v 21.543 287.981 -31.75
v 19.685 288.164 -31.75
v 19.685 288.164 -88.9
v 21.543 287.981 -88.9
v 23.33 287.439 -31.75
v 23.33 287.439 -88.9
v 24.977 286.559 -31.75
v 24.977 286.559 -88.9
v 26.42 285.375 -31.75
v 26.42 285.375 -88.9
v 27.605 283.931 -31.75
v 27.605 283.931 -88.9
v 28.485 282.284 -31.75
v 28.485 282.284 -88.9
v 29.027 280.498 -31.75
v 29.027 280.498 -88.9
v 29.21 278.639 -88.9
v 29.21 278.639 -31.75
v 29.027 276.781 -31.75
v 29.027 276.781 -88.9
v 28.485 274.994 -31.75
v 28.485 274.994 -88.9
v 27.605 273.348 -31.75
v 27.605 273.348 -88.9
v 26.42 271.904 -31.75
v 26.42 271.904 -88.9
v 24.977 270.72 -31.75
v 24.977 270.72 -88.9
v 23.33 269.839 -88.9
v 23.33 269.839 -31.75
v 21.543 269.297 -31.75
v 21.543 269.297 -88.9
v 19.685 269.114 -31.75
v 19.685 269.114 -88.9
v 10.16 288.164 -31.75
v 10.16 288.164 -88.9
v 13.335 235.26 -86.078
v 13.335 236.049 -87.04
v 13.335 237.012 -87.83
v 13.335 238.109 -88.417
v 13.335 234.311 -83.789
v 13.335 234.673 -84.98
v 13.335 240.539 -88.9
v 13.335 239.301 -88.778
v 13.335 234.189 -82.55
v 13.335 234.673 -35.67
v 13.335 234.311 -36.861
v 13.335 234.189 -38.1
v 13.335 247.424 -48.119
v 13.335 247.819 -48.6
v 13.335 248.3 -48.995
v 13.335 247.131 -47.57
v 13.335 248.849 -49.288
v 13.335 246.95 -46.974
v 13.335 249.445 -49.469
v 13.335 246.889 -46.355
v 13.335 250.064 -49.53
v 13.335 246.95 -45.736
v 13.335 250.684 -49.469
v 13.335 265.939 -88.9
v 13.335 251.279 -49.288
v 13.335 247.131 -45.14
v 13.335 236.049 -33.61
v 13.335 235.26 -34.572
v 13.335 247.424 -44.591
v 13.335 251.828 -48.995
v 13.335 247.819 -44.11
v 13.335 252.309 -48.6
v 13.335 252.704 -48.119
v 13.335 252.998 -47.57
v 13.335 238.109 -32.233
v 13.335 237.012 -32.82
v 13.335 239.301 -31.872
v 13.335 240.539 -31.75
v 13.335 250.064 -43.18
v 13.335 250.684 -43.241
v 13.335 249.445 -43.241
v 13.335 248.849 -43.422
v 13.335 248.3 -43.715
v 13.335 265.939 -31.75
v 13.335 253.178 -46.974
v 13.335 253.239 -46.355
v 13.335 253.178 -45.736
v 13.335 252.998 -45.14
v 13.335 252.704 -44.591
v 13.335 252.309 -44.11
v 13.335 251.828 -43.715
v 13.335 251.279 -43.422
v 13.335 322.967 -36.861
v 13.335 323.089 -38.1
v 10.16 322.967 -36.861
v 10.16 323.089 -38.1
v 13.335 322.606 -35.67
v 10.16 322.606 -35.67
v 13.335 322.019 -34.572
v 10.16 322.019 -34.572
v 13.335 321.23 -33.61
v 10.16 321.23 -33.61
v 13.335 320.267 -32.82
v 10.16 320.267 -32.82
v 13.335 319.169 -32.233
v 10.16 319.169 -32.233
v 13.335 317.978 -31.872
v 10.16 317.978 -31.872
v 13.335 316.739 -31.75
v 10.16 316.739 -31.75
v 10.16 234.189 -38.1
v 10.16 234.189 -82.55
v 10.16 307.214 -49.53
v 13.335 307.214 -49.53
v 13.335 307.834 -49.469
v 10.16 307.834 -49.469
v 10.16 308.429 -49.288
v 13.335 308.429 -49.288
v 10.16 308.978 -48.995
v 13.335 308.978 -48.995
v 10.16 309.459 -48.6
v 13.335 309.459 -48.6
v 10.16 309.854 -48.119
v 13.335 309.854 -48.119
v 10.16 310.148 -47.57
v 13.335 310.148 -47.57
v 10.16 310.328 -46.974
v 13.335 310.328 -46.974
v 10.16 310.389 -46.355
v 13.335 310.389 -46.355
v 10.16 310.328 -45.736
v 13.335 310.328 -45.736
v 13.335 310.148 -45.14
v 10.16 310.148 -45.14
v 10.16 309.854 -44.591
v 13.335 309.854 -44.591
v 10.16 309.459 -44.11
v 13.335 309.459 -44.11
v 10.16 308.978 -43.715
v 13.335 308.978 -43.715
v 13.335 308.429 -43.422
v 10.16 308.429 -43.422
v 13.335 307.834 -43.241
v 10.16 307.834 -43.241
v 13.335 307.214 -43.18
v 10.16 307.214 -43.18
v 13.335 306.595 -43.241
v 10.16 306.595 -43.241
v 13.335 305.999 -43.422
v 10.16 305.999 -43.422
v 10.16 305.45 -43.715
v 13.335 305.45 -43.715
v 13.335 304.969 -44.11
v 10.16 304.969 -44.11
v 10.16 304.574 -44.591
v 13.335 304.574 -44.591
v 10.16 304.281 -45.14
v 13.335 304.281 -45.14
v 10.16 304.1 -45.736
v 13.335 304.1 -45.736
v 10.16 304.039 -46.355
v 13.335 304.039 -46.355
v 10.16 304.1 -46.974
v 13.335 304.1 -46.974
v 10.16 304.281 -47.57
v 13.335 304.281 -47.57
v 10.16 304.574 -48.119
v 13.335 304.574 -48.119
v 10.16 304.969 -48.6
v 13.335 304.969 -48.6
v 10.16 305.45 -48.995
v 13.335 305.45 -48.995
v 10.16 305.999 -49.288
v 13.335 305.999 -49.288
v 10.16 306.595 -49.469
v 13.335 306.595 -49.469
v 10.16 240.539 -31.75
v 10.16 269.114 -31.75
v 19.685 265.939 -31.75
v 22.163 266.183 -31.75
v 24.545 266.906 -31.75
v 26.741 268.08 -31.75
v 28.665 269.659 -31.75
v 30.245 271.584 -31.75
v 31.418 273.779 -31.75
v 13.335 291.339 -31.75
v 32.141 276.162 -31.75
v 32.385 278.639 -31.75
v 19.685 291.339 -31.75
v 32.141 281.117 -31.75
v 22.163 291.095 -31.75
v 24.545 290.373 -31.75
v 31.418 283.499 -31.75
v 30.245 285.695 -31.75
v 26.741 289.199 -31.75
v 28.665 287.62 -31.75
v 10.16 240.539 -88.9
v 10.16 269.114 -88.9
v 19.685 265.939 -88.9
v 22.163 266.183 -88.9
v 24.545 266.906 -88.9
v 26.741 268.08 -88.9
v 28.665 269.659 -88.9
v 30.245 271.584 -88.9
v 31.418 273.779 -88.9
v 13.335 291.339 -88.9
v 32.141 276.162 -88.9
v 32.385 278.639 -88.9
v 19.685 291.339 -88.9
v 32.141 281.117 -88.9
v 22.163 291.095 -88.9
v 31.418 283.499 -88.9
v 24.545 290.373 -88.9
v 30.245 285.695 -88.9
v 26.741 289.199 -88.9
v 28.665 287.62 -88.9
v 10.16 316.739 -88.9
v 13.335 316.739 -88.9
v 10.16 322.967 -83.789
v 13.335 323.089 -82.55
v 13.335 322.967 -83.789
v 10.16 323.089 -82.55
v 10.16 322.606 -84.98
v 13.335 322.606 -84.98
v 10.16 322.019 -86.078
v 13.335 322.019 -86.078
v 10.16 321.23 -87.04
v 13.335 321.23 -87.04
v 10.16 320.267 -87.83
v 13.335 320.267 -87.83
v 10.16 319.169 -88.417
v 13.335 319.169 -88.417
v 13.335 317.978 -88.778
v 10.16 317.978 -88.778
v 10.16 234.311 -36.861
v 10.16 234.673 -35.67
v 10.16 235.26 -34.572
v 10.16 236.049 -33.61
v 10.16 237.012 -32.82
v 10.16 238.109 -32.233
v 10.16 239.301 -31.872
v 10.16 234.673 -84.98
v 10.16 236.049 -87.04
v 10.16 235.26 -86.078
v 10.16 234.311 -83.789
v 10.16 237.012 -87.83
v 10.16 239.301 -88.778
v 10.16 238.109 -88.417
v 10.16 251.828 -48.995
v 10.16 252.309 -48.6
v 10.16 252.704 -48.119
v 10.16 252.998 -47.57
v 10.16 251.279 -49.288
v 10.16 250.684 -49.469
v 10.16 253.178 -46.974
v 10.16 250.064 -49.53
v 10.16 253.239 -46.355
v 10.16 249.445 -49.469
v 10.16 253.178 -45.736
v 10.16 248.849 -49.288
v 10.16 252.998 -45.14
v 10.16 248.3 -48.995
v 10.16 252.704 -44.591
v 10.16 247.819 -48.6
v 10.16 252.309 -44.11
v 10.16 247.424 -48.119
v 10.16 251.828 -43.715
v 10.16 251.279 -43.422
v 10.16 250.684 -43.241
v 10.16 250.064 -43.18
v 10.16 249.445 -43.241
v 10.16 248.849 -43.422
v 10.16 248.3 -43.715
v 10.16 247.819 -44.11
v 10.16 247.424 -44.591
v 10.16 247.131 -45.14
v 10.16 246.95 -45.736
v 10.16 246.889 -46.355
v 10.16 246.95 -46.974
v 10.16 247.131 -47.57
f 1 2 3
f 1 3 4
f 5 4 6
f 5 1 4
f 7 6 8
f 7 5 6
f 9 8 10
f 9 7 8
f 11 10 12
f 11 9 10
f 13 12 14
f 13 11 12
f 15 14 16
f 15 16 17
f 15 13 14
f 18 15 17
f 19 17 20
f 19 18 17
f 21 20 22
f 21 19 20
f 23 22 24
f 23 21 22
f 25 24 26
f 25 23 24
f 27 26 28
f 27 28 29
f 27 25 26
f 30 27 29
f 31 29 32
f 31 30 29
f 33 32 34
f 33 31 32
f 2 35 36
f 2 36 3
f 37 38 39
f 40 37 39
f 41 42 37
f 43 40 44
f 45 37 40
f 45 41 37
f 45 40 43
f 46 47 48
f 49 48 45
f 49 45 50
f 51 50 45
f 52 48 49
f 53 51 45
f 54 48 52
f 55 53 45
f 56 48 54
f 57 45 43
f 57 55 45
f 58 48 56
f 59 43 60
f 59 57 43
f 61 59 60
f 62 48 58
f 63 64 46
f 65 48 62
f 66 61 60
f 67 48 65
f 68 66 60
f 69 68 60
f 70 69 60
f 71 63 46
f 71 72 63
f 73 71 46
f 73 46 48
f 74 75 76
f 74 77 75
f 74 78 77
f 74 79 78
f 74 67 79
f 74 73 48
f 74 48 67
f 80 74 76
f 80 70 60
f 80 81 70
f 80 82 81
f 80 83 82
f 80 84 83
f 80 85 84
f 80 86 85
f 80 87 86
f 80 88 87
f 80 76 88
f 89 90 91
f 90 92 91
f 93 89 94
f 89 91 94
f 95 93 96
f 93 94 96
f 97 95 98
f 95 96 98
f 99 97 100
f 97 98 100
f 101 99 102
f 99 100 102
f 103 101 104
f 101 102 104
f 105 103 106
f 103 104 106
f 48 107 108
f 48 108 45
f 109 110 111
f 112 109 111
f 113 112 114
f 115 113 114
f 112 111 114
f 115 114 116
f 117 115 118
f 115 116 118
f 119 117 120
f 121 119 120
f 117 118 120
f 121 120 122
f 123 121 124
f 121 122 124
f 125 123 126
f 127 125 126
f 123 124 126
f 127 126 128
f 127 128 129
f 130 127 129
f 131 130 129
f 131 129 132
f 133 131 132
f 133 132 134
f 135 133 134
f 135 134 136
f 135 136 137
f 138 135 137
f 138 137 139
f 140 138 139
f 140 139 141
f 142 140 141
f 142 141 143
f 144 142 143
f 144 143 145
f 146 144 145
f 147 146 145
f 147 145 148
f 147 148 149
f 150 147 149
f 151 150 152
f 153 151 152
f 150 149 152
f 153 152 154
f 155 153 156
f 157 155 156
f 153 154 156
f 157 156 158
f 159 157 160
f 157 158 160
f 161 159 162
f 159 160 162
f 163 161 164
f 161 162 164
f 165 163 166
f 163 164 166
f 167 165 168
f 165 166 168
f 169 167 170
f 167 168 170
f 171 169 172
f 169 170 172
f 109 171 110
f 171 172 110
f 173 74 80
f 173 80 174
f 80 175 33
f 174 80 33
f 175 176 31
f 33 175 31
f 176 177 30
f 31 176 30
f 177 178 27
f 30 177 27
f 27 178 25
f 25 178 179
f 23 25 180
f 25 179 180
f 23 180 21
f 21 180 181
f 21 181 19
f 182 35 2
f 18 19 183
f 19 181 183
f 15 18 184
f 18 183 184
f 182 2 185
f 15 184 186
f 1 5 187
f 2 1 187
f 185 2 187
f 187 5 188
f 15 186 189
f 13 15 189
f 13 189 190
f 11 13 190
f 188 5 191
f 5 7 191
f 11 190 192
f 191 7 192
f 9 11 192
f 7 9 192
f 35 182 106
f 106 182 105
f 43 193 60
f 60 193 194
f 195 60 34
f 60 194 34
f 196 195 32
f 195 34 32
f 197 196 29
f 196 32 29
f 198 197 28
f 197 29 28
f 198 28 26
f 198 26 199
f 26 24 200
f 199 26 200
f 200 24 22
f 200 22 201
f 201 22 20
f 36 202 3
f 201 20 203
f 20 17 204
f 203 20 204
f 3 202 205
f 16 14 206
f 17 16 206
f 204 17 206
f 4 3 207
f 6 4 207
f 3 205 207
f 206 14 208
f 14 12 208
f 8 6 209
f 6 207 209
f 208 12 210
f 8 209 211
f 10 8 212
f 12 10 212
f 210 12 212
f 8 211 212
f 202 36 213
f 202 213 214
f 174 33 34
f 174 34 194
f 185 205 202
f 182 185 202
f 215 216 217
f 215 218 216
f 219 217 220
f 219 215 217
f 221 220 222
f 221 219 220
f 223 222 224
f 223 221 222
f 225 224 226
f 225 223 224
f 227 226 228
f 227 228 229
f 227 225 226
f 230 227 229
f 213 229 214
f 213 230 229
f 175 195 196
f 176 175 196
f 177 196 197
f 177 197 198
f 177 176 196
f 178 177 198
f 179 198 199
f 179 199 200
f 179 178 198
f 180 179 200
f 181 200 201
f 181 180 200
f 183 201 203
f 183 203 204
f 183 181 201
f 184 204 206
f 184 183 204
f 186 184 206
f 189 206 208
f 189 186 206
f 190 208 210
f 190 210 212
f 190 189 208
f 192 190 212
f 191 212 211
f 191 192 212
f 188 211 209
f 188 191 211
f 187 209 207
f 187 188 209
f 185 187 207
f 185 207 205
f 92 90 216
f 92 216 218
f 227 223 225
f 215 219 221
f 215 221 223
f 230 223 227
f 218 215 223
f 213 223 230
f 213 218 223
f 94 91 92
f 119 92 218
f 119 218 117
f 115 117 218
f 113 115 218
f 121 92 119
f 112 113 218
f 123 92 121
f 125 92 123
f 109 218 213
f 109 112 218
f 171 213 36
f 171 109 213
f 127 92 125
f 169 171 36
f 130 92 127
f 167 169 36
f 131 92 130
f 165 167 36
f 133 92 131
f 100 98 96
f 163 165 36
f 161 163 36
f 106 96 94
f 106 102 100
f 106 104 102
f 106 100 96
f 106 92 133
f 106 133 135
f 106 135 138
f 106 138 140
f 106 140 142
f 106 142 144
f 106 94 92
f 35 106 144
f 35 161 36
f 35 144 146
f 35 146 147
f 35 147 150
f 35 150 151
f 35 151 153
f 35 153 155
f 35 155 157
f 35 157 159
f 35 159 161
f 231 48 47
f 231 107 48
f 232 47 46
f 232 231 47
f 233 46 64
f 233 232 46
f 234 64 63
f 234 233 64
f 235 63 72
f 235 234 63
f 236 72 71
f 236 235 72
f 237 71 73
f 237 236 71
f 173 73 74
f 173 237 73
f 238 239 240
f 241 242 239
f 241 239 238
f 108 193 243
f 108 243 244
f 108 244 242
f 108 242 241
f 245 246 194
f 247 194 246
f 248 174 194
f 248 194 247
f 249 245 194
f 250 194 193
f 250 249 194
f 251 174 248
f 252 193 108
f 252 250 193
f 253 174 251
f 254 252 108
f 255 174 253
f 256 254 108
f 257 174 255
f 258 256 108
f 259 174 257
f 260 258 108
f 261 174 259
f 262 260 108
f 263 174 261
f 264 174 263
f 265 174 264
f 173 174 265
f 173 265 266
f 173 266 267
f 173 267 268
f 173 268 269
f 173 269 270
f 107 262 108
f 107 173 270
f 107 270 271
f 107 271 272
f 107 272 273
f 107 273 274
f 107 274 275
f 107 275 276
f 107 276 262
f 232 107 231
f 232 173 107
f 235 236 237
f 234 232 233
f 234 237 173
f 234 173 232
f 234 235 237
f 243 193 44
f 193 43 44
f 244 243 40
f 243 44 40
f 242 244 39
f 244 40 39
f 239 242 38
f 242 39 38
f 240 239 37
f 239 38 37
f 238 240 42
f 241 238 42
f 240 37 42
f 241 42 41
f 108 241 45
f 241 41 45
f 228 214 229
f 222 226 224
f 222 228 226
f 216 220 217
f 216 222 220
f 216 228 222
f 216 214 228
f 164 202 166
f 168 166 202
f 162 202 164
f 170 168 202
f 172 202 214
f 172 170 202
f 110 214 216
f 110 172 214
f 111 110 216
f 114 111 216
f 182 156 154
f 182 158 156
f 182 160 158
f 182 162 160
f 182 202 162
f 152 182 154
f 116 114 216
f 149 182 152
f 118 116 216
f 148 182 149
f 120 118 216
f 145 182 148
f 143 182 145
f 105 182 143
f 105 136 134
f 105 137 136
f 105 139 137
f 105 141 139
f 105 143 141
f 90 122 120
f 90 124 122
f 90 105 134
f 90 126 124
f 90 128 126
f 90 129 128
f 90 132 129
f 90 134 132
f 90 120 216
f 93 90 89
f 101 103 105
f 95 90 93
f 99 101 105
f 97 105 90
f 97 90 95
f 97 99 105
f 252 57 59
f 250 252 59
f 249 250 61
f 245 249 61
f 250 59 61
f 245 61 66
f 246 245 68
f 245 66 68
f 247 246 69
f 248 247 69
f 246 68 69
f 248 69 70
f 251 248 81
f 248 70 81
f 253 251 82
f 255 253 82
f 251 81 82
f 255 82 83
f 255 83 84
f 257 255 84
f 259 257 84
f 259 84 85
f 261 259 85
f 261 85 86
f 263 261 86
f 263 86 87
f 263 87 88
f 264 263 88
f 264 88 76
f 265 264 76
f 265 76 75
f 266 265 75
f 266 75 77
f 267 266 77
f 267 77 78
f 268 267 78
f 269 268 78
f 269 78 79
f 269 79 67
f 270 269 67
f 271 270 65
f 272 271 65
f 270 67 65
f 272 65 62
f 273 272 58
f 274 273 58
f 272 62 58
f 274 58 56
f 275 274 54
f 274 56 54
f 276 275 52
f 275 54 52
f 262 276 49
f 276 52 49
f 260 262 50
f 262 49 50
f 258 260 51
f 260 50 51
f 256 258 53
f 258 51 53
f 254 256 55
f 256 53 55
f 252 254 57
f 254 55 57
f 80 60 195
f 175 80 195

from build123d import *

# Parameters (mm, degrees)
BOSS_EXTRUDE1_DEPTH     = 88.9
SKETCH2_R               = 3.175
CUT_EXTRUDE1_DEPTH      = 4.175
FILLET1_R               = 6.35
SKETCH3_W               = 31.75
SKETCH3_H               = 57.15
CUT_EXTRUDE2_DEPTH      = 20.05
CUT_EXTRUDE2_DEPTH_BACK = 4.175
FILLET2_R               = 6.35


with BuildPart() as part:
    # Sketch1 → Boss-Extrude1 (new body)
    with BuildSketch(Plane.XY):
        with BuildLine():
            Line((13.335, 323.089397322), (10.16, 323.089397322))
            Line((10.16, 323.089397322), (10.16, 288.164397322))
            Line((10.16, 288.164397322), (19.685, 288.164397322))
            ThreePointArc((19.685, 288.164397322), (29.21, 278.639397322), (19.685, 269.114397322))
            Line((19.685, 269.114397322), (10.16, 269.114397322))
            Line((10.16, 269.114397322), (10.16, 234.189397322))
            Line((10.16, 234.189397322), (13.335, 234.189397322))
            Line((13.335, 234.189397322), (13.335, 265.939397322))
            Line((13.335, 265.939397322), (19.685, 265.939397322))
            ThreePointArc((19.685, 265.939397322), (32.385, 278.639397322), (19.685, 291.339397322))
            Line((19.685, 291.339397322), (13.335, 291.339397322))
            Line((13.335, 291.339397322), (13.335, 323.089397322))
        make_face()
    extrude(amount=-BOSS_EXTRUDE1_DEPTH)

    # Sketch2 → Cut-Extrude1 (cut, through all)
    with BuildSketch(Plane(origin=(13.335, 0, 0), x_dir=(0, 0, -1), z_dir=(1, 0, 0))):
        with Locations((46.355, 250.064397322)):
            Circle(SKETCH2_R)
        with Locations((46.355, 307.214397322)):
            Circle(SKETCH2_R)
    extrude(amount=-CUT_EXTRUDE1_DEPTH, mode=Mode.SUBTRACT)

    # Fillet1
    fillet1_edges = [part.edges().sort_by_distance(p)[0] for p in [
        (11.7475, 323.089397322, 0),
        (11.7475, 234.189397322, 0),
        (11.7475, 234.189397322, -88.9),
        (11.7475, 323.089397322, -88.9),
    ]]
    fillet(fillet1_edges, radius=FILLET1_R)

    # Sketch3 → Cut-Extrude2 (cut, two sides)
    with BuildSketch(Plane(origin=(13.335, 0, 0), x_dir=(0, 0, -1), z_dir=(1, 0, 0))) as cut_extrude2_sk:
        with Locations((15.875, 294.514397322)):
            Rectangle(SKETCH3_W, SKETCH3_H)
        with BuildLine():
            Line((31.75, 234.189397322), (31.75, 265.939397322))
            Line((31.75, 265.939397322), (0, 265.939397322))
            Line((0, 265.939397322), (0, 240.539397322))
            ThreePointArc((0, 240.539397322), (1.859871939, 236.049269261), (6.35, 234.189397322))
            Line((6.35, 234.189397322), (31.75, 234.189397322))
        make_face()
    extrude(amount=CUT_EXTRUDE2_DEPTH, mode=Mode.SUBTRACT)
    extrude(cut_extrude2_sk.sketch, amount=-CUT_EXTRUDE2_DEPTH_BACK, mode=Mode.SUBTRACT)

    # Fillet2
    fillet2_edges = [part.edges().sort_by_distance(p)[0] for p in [
        (11.7475, 234.189397322, -31.75),
        (11.7475, 323.089397322, -31.75),
    ]]
    fillet(fillet2_edges, radius=FILLET2_R)


solid = part.part
